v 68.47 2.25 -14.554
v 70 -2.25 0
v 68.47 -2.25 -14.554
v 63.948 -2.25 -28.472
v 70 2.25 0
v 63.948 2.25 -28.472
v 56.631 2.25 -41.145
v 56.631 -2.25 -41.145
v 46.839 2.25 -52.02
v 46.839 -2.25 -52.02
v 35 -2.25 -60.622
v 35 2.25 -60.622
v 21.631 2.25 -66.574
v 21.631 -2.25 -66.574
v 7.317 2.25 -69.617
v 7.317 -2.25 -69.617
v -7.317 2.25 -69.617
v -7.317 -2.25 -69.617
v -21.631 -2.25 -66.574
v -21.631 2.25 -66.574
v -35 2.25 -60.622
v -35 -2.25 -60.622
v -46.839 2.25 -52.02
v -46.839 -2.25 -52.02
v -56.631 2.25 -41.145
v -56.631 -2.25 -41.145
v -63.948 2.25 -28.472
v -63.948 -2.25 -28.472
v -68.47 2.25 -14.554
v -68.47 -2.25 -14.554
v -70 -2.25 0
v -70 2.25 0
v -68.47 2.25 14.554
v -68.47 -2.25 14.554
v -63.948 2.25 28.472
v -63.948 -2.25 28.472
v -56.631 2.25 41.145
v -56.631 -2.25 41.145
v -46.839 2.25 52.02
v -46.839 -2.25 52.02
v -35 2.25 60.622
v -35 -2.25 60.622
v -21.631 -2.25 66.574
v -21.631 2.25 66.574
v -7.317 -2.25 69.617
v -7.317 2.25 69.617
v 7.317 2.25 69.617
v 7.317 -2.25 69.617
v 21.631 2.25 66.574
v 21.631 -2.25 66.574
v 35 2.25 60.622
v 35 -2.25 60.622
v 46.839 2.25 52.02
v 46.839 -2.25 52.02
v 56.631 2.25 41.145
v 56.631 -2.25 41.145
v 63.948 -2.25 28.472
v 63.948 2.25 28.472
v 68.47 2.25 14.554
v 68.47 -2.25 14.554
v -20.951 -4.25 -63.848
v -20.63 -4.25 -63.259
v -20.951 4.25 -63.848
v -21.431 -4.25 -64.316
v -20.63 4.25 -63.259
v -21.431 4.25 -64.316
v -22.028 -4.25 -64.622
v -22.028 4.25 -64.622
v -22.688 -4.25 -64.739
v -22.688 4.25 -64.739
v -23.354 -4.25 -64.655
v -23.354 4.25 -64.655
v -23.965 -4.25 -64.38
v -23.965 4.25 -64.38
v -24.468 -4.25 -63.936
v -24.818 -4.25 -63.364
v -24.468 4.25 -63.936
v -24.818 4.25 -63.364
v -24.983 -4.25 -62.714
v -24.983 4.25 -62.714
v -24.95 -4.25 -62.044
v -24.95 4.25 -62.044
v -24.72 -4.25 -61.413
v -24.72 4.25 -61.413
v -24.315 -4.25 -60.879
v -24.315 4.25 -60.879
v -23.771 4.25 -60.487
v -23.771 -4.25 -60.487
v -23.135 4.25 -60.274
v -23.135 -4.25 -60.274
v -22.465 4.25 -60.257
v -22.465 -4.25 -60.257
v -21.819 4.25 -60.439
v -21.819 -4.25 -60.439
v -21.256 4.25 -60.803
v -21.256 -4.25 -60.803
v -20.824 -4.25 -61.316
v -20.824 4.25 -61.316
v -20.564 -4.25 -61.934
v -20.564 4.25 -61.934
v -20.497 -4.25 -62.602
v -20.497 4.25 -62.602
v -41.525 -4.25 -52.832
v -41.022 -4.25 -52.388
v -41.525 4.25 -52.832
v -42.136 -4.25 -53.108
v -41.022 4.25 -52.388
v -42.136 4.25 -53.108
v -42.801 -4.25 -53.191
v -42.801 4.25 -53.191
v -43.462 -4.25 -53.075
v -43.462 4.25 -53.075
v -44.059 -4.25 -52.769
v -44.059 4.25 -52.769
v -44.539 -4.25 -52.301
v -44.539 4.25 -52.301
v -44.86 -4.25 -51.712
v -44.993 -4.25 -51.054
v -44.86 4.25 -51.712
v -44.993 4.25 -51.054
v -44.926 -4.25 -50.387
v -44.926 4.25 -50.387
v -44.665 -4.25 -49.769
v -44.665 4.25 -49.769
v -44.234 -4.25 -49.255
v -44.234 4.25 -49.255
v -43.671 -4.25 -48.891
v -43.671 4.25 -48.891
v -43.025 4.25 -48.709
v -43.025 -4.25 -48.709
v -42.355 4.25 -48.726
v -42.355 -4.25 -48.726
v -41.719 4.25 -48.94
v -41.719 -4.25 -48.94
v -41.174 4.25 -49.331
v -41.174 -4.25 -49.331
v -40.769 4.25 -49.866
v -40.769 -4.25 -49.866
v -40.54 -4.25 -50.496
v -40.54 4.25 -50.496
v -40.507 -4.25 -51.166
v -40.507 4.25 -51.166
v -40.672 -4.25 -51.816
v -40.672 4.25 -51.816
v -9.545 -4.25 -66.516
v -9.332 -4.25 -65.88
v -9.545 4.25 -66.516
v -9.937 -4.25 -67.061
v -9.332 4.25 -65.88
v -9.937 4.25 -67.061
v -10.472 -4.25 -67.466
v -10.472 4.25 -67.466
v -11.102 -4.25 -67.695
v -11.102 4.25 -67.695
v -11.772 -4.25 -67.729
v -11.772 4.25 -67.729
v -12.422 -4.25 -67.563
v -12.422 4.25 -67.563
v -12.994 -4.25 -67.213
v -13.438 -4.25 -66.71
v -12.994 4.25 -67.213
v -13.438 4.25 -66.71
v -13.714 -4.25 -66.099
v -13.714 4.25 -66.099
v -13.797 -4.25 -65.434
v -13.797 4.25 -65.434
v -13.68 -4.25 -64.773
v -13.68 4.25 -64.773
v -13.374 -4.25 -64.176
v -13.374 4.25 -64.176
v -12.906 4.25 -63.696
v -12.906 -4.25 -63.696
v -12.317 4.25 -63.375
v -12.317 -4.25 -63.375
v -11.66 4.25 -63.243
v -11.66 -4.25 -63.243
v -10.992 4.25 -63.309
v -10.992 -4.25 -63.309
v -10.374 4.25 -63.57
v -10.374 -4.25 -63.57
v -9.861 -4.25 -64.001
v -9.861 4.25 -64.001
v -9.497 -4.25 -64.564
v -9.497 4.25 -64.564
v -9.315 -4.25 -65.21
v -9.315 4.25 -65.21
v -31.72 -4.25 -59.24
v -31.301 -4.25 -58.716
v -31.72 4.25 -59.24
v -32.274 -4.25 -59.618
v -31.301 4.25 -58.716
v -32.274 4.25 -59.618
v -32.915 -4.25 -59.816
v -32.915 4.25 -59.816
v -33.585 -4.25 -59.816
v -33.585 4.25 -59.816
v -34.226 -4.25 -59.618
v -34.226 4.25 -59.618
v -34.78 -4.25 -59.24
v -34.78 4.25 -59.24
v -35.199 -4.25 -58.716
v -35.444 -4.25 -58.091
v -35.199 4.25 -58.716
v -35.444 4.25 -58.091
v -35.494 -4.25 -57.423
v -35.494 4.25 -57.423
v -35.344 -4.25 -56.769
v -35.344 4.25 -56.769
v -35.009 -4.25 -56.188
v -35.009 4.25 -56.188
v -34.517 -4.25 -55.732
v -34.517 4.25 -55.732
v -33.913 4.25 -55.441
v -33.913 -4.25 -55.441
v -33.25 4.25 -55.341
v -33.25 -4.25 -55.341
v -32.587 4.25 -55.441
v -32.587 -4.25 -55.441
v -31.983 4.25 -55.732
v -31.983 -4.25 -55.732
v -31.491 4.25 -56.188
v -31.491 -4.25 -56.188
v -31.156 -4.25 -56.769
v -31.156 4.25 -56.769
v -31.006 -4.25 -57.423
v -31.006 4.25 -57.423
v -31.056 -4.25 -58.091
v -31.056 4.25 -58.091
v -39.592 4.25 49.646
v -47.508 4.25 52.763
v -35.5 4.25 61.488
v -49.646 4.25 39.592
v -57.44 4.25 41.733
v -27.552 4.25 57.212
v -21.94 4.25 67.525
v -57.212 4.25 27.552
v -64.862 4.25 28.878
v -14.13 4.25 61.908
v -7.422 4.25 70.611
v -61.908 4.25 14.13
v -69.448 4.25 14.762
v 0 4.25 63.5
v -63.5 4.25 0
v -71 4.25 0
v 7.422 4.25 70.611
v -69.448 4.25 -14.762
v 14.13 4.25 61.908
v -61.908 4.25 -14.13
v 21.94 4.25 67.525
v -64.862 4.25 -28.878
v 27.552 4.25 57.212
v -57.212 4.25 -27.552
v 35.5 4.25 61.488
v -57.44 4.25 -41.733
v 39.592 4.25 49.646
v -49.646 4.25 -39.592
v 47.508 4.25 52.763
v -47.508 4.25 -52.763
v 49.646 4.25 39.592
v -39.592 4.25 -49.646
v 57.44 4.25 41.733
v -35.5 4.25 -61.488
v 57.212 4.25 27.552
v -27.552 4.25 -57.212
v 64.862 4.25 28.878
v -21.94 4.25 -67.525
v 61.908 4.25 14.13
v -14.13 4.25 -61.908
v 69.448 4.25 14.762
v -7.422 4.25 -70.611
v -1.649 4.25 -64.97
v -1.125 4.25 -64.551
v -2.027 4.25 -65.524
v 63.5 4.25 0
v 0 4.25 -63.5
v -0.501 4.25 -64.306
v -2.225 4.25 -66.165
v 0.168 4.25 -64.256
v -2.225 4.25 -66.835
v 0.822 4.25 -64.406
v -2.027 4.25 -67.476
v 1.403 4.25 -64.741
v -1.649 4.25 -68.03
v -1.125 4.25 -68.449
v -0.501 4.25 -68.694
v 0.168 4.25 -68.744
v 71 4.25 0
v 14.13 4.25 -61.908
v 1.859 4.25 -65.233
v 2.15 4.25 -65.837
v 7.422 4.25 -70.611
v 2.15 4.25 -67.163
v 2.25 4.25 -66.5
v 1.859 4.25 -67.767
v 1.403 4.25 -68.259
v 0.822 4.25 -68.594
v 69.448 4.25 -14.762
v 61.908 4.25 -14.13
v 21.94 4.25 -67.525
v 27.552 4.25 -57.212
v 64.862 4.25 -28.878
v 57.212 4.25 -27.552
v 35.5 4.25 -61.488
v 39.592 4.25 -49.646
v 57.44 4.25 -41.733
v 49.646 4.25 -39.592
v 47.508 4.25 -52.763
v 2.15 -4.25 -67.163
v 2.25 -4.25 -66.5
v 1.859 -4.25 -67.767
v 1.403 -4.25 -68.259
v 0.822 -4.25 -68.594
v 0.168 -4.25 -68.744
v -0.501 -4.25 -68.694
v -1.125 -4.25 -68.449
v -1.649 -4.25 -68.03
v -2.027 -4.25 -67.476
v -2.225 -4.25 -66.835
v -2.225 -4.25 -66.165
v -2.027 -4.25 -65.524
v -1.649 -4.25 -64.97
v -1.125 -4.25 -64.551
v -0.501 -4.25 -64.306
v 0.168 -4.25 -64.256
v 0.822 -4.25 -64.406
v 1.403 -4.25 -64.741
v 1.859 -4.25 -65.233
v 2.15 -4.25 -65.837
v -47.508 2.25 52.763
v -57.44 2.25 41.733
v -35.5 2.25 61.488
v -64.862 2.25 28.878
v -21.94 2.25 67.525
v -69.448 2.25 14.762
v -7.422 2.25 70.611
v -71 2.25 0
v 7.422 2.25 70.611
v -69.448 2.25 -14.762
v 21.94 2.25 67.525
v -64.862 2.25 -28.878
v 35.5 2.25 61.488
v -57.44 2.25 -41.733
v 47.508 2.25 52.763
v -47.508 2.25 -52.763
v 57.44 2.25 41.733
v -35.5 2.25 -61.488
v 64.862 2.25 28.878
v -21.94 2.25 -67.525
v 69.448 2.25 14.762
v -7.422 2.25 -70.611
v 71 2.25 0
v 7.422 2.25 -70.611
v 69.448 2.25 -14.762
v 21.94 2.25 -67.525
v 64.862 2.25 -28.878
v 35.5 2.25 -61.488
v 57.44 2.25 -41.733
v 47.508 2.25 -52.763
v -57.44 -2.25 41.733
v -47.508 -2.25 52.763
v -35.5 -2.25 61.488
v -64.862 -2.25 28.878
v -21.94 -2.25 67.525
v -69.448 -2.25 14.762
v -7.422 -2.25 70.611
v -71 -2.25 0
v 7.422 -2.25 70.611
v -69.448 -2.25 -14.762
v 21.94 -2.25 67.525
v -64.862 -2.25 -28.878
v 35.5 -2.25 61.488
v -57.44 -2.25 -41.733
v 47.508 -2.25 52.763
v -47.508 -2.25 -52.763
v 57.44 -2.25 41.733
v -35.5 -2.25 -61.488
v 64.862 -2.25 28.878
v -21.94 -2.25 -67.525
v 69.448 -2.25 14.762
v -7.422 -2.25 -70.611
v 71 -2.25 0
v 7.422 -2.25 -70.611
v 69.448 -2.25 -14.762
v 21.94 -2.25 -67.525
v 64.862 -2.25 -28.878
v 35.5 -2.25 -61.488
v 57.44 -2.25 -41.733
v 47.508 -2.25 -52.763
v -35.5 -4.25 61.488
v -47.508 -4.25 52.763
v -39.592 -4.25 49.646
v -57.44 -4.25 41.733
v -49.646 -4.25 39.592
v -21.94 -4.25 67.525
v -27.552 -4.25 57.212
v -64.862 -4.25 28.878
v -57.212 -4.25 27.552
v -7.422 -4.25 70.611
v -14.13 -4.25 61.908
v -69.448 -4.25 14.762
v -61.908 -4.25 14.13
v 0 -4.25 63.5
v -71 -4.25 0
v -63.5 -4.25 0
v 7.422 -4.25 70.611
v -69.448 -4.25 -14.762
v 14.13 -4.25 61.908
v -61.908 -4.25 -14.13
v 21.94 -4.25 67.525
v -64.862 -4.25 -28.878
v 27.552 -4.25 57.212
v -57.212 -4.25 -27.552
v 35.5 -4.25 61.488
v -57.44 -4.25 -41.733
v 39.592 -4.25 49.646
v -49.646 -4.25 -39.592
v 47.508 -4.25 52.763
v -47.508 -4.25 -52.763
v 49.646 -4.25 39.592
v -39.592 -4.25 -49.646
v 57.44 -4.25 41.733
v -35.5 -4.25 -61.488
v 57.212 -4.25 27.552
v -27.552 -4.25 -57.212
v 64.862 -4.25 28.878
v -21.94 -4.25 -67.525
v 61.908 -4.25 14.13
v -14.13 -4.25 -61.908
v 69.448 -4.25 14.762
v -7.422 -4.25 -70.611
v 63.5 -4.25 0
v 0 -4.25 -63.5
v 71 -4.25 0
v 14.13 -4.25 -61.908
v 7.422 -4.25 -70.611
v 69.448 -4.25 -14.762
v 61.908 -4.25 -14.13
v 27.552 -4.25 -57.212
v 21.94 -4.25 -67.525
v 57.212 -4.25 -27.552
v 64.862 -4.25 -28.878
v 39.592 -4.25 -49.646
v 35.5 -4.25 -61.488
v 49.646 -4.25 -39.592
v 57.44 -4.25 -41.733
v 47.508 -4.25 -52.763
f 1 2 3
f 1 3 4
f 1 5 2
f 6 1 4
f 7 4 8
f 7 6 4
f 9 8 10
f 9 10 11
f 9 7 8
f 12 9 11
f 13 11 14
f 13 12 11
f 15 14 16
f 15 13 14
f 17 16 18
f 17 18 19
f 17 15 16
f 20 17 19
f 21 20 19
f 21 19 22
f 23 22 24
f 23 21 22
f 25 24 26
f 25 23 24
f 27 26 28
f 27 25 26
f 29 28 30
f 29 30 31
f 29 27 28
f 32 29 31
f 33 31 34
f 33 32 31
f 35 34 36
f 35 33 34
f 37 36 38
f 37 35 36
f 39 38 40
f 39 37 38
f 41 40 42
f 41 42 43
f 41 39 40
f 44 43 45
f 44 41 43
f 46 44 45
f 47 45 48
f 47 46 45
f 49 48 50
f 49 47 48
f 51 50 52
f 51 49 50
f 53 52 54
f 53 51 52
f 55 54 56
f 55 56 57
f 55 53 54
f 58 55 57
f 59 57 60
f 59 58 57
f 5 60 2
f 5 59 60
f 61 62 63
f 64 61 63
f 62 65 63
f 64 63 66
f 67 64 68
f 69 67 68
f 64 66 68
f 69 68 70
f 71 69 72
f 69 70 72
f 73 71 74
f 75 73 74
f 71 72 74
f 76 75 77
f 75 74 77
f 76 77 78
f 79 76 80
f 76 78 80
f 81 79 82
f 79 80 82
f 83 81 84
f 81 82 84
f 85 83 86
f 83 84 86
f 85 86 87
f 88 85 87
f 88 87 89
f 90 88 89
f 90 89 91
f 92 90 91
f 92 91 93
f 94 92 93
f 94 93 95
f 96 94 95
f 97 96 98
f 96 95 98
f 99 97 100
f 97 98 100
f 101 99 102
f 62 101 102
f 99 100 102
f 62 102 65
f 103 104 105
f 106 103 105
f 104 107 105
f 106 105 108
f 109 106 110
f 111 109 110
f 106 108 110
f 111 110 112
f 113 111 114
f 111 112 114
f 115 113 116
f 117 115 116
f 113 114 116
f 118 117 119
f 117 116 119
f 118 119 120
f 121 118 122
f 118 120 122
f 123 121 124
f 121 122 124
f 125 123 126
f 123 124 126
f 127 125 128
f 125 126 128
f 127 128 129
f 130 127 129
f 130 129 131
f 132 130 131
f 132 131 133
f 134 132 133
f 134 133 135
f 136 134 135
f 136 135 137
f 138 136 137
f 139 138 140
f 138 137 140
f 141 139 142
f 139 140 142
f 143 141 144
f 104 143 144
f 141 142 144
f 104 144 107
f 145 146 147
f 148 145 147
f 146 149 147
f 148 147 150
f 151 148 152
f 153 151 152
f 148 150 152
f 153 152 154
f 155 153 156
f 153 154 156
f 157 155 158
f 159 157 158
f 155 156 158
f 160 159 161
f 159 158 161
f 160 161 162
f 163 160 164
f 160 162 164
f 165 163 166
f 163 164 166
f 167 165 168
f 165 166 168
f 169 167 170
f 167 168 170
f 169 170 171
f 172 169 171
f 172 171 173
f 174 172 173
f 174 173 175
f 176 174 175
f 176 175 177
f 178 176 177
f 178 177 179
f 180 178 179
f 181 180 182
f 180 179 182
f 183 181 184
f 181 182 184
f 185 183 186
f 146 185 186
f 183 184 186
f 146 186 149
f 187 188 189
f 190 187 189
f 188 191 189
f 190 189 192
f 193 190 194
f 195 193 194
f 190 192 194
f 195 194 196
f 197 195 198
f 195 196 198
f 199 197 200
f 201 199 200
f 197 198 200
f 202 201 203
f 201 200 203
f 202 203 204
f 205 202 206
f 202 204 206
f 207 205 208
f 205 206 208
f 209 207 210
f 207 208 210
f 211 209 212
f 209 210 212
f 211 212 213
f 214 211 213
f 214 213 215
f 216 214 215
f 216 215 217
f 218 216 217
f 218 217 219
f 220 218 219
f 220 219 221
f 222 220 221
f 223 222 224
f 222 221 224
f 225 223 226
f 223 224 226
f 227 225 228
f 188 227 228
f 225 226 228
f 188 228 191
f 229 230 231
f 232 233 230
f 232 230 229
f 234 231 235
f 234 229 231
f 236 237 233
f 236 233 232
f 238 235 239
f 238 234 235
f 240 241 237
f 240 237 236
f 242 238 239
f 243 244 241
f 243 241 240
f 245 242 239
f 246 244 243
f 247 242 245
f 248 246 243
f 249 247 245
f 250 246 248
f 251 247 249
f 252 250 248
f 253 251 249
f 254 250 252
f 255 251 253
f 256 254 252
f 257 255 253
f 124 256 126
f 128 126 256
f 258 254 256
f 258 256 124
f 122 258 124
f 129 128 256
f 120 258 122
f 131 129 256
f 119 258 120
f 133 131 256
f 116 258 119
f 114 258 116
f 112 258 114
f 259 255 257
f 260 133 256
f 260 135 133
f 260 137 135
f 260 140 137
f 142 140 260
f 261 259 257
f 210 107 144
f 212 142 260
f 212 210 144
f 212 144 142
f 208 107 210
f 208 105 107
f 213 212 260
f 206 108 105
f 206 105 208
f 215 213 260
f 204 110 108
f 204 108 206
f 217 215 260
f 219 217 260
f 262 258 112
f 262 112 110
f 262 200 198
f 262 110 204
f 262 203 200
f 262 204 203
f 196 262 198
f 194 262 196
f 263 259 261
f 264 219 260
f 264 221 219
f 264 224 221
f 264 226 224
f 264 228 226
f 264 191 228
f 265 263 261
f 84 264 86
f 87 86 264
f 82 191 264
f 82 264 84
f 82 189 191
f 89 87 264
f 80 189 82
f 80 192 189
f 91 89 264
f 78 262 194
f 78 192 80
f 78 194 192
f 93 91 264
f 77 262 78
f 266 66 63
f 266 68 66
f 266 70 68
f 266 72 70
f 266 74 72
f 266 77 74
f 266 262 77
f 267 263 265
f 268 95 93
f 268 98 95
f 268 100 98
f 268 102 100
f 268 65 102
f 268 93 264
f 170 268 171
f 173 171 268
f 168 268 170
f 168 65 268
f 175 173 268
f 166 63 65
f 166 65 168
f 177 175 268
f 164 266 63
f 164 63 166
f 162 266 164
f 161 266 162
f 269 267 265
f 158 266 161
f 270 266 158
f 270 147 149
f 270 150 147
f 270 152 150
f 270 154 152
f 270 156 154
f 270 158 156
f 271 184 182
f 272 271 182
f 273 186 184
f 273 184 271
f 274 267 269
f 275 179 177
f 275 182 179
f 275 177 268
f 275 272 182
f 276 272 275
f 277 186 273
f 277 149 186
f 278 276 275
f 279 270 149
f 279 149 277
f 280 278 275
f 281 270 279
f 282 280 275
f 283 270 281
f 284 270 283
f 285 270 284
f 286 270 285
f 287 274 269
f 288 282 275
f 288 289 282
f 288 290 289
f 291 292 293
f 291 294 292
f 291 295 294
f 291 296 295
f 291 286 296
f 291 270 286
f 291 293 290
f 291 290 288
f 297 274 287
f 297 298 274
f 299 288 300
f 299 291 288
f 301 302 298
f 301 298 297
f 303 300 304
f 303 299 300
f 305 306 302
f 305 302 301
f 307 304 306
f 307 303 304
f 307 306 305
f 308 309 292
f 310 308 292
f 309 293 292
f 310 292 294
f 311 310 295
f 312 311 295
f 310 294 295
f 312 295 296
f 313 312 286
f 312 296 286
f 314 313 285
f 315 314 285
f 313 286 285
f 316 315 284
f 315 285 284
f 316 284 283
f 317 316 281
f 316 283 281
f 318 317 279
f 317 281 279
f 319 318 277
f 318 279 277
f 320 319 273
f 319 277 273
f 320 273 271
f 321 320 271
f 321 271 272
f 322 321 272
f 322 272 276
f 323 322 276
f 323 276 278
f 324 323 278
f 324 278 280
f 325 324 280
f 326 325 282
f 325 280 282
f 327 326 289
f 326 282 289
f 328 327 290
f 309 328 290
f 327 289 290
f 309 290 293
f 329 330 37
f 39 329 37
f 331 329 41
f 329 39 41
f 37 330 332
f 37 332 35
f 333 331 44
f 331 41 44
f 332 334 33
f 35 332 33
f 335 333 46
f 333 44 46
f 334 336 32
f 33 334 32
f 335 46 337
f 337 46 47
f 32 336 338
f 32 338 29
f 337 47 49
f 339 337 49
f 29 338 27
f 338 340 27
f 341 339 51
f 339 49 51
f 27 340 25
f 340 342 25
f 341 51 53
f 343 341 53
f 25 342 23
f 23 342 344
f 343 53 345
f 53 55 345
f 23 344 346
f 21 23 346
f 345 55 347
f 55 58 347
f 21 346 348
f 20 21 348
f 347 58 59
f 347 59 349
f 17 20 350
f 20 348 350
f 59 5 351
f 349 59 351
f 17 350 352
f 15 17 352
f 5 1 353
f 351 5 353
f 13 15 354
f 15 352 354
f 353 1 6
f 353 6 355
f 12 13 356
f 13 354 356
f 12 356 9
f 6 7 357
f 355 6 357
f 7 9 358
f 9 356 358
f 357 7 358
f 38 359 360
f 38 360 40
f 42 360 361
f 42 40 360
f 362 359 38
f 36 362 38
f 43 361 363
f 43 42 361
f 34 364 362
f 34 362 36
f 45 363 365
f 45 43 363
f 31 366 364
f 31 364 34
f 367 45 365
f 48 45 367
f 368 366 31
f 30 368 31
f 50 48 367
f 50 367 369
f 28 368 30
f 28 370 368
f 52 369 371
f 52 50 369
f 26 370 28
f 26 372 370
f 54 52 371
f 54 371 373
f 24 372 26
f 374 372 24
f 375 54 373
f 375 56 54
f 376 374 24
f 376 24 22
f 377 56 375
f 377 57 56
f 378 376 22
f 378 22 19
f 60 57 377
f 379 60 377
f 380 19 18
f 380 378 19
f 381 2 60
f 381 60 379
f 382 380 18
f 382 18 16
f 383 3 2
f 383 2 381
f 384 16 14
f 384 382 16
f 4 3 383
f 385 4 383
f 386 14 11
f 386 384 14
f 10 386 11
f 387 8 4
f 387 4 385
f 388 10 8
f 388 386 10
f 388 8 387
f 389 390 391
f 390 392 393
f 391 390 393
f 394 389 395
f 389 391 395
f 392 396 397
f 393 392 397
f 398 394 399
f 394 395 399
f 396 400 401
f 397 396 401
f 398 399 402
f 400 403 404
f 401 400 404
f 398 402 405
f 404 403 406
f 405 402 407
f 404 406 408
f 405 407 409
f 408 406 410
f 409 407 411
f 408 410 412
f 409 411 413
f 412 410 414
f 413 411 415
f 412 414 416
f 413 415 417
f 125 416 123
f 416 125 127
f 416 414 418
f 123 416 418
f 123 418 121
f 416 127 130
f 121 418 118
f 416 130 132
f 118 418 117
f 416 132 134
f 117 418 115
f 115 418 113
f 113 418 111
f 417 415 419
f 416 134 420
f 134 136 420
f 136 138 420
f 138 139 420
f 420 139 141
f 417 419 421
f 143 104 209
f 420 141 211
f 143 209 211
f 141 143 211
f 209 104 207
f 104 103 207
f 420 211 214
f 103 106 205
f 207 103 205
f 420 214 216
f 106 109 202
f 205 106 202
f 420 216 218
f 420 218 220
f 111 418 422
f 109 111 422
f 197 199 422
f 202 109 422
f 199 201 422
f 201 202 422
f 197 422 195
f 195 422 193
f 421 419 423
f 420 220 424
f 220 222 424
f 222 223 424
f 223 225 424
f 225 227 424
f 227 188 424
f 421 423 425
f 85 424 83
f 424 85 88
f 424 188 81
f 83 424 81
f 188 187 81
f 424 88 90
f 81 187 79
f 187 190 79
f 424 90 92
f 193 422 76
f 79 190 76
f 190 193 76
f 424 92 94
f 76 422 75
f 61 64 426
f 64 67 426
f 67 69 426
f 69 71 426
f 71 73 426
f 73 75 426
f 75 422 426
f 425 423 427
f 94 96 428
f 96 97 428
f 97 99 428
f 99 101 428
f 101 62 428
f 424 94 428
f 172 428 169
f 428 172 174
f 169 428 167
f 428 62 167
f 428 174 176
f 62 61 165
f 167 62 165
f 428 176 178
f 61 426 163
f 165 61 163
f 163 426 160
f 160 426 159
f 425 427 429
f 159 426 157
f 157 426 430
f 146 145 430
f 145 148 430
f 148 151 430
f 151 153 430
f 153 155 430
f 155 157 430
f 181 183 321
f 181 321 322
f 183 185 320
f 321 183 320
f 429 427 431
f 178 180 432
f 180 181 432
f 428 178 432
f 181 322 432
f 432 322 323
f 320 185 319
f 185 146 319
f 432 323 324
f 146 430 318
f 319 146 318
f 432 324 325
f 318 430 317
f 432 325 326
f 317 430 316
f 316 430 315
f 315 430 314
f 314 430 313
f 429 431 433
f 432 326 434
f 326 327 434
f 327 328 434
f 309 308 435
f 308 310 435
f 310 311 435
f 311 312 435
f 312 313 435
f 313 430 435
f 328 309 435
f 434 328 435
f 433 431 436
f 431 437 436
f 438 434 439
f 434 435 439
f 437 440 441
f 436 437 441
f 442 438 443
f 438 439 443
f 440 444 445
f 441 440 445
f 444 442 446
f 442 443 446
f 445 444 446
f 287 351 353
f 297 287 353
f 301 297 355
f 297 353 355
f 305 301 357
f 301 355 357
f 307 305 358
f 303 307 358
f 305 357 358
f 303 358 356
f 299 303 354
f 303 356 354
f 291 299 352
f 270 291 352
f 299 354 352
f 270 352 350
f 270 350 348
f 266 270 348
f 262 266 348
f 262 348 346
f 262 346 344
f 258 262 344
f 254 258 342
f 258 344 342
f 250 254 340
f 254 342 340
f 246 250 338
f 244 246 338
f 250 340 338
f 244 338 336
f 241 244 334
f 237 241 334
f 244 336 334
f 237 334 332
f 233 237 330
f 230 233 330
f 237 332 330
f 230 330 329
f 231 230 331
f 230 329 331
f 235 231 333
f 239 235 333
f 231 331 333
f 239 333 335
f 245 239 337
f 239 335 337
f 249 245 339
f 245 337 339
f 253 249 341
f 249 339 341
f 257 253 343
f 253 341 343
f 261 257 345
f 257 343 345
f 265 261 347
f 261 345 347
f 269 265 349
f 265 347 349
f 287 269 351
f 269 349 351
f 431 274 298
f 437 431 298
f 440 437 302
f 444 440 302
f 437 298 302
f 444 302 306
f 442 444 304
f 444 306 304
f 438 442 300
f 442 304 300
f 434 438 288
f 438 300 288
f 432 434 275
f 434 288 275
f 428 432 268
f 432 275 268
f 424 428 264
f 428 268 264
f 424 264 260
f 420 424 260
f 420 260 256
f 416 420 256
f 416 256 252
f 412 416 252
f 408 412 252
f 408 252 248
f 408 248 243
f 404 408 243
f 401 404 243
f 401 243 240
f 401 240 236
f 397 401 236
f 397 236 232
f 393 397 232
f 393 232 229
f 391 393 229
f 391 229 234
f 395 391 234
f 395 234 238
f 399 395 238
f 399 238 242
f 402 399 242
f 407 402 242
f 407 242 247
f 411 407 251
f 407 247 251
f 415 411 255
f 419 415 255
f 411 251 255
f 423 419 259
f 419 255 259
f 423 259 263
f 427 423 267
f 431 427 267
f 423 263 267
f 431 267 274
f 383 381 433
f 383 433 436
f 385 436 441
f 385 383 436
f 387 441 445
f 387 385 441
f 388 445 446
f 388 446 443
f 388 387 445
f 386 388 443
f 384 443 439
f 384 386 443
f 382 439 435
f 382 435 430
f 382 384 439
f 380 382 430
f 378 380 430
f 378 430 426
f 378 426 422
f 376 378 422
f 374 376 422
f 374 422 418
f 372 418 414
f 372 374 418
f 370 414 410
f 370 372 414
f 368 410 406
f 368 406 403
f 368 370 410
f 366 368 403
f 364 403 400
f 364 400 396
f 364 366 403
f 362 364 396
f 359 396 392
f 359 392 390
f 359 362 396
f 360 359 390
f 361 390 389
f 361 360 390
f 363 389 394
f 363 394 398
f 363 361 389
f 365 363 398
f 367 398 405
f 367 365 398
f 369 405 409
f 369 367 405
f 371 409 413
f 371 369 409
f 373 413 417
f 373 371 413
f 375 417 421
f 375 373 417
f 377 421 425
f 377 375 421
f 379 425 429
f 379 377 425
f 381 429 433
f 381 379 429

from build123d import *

# Parameters (mm, degrees)
SKETCH1_R               = 70
BOSS_EXTRUDE1_DEPTH     = 2.25
SKETCH2_R               = 71
BOSS_EXTRUDE2_DEPTH     = 2
SKETCH3_R               = 63.5
CUT_EXTRUDE1_DEPTH      = 1
CUT_EXTRUDE1_DEPTH_BACK = 9.5
SKETCH5_R               = 2.25
CUT_EXTRUDE3_DEPTH      = 5.25
CIRPATTERN1_COUNT       = 5
CIRPATTERN1_ANGLE       = 40


with BuildPart() as part:
    # Sketch1 → Boss-Extrude1 (new body, symmetric)
    with BuildSketch(Plane(origin=(0, 0, 0), x_dir=(1, 0, 0), z_dir=(0, 1, 0))):
        Circle(SKETCH1_R)
    extrude(amount=BOSS_EXTRUDE1_DEPTH, both=True)

    # Sketch2 → Boss-Extrude2 (add)
    with BuildSketch(Plane(origin=(0, 2.25, 0), x_dir=(1, 0, 0), z_dir=(0, 1, 0))):
        Circle(SKETCH2_R)
    boss_extrude2 = extrude(amount=BOSS_EXTRUDE2_DEPTH)

    # Mirror1: Boss-Extrude2 across plane
    add(boss_extrude2.mirror(Plane.ZX))

    # Sketch3 → Cut-Extrude1 (cut, two sides)
    with BuildSketch(Plane(origin=(0, 4.25, 0), x_dir=(1, 0, 0), z_dir=(0, 1, 0))) as cut_extrude1_sk:
        Circle(SKETCH3_R)
    extrude(amount=CUT_EXTRUDE1_DEPTH, mode=Mode.SUBTRACT)
    extrude(cut_extrude1_sk.sketch, amount=-CUT_EXTRUDE1_DEPTH_BACK, mode=Mode.SUBTRACT)

    # Sketch5 → Cut-Extrude3 (cut, symmetric)
    with BuildSketch(Plane(origin=(0, 0, 0), x_dir=(1, 0, 0), z_dir=(0, 1, 0))):
        with Locations((0, 66.5)):
            Circle(SKETCH5_R)
    cut_extrude3 = extrude(amount=CUT_EXTRUDE3_DEPTH, both=True, mode=Mode.SUBTRACT)

    # CirPattern1: Cut-Extrude3 ×5 about axis
    cirpattern1_axis = Axis((0, 0, 0), (0, 1, 0))
    for i in range(1, CIRPATTERN1_COUNT):
        add(cut_extrude3.rotate(cirpattern1_axis, i * CIRPATTERN1_ANGLE / (CIRPATTERN1_COUNT - 1)), mode=Mode.SUBTRACT)


solid = part.part
